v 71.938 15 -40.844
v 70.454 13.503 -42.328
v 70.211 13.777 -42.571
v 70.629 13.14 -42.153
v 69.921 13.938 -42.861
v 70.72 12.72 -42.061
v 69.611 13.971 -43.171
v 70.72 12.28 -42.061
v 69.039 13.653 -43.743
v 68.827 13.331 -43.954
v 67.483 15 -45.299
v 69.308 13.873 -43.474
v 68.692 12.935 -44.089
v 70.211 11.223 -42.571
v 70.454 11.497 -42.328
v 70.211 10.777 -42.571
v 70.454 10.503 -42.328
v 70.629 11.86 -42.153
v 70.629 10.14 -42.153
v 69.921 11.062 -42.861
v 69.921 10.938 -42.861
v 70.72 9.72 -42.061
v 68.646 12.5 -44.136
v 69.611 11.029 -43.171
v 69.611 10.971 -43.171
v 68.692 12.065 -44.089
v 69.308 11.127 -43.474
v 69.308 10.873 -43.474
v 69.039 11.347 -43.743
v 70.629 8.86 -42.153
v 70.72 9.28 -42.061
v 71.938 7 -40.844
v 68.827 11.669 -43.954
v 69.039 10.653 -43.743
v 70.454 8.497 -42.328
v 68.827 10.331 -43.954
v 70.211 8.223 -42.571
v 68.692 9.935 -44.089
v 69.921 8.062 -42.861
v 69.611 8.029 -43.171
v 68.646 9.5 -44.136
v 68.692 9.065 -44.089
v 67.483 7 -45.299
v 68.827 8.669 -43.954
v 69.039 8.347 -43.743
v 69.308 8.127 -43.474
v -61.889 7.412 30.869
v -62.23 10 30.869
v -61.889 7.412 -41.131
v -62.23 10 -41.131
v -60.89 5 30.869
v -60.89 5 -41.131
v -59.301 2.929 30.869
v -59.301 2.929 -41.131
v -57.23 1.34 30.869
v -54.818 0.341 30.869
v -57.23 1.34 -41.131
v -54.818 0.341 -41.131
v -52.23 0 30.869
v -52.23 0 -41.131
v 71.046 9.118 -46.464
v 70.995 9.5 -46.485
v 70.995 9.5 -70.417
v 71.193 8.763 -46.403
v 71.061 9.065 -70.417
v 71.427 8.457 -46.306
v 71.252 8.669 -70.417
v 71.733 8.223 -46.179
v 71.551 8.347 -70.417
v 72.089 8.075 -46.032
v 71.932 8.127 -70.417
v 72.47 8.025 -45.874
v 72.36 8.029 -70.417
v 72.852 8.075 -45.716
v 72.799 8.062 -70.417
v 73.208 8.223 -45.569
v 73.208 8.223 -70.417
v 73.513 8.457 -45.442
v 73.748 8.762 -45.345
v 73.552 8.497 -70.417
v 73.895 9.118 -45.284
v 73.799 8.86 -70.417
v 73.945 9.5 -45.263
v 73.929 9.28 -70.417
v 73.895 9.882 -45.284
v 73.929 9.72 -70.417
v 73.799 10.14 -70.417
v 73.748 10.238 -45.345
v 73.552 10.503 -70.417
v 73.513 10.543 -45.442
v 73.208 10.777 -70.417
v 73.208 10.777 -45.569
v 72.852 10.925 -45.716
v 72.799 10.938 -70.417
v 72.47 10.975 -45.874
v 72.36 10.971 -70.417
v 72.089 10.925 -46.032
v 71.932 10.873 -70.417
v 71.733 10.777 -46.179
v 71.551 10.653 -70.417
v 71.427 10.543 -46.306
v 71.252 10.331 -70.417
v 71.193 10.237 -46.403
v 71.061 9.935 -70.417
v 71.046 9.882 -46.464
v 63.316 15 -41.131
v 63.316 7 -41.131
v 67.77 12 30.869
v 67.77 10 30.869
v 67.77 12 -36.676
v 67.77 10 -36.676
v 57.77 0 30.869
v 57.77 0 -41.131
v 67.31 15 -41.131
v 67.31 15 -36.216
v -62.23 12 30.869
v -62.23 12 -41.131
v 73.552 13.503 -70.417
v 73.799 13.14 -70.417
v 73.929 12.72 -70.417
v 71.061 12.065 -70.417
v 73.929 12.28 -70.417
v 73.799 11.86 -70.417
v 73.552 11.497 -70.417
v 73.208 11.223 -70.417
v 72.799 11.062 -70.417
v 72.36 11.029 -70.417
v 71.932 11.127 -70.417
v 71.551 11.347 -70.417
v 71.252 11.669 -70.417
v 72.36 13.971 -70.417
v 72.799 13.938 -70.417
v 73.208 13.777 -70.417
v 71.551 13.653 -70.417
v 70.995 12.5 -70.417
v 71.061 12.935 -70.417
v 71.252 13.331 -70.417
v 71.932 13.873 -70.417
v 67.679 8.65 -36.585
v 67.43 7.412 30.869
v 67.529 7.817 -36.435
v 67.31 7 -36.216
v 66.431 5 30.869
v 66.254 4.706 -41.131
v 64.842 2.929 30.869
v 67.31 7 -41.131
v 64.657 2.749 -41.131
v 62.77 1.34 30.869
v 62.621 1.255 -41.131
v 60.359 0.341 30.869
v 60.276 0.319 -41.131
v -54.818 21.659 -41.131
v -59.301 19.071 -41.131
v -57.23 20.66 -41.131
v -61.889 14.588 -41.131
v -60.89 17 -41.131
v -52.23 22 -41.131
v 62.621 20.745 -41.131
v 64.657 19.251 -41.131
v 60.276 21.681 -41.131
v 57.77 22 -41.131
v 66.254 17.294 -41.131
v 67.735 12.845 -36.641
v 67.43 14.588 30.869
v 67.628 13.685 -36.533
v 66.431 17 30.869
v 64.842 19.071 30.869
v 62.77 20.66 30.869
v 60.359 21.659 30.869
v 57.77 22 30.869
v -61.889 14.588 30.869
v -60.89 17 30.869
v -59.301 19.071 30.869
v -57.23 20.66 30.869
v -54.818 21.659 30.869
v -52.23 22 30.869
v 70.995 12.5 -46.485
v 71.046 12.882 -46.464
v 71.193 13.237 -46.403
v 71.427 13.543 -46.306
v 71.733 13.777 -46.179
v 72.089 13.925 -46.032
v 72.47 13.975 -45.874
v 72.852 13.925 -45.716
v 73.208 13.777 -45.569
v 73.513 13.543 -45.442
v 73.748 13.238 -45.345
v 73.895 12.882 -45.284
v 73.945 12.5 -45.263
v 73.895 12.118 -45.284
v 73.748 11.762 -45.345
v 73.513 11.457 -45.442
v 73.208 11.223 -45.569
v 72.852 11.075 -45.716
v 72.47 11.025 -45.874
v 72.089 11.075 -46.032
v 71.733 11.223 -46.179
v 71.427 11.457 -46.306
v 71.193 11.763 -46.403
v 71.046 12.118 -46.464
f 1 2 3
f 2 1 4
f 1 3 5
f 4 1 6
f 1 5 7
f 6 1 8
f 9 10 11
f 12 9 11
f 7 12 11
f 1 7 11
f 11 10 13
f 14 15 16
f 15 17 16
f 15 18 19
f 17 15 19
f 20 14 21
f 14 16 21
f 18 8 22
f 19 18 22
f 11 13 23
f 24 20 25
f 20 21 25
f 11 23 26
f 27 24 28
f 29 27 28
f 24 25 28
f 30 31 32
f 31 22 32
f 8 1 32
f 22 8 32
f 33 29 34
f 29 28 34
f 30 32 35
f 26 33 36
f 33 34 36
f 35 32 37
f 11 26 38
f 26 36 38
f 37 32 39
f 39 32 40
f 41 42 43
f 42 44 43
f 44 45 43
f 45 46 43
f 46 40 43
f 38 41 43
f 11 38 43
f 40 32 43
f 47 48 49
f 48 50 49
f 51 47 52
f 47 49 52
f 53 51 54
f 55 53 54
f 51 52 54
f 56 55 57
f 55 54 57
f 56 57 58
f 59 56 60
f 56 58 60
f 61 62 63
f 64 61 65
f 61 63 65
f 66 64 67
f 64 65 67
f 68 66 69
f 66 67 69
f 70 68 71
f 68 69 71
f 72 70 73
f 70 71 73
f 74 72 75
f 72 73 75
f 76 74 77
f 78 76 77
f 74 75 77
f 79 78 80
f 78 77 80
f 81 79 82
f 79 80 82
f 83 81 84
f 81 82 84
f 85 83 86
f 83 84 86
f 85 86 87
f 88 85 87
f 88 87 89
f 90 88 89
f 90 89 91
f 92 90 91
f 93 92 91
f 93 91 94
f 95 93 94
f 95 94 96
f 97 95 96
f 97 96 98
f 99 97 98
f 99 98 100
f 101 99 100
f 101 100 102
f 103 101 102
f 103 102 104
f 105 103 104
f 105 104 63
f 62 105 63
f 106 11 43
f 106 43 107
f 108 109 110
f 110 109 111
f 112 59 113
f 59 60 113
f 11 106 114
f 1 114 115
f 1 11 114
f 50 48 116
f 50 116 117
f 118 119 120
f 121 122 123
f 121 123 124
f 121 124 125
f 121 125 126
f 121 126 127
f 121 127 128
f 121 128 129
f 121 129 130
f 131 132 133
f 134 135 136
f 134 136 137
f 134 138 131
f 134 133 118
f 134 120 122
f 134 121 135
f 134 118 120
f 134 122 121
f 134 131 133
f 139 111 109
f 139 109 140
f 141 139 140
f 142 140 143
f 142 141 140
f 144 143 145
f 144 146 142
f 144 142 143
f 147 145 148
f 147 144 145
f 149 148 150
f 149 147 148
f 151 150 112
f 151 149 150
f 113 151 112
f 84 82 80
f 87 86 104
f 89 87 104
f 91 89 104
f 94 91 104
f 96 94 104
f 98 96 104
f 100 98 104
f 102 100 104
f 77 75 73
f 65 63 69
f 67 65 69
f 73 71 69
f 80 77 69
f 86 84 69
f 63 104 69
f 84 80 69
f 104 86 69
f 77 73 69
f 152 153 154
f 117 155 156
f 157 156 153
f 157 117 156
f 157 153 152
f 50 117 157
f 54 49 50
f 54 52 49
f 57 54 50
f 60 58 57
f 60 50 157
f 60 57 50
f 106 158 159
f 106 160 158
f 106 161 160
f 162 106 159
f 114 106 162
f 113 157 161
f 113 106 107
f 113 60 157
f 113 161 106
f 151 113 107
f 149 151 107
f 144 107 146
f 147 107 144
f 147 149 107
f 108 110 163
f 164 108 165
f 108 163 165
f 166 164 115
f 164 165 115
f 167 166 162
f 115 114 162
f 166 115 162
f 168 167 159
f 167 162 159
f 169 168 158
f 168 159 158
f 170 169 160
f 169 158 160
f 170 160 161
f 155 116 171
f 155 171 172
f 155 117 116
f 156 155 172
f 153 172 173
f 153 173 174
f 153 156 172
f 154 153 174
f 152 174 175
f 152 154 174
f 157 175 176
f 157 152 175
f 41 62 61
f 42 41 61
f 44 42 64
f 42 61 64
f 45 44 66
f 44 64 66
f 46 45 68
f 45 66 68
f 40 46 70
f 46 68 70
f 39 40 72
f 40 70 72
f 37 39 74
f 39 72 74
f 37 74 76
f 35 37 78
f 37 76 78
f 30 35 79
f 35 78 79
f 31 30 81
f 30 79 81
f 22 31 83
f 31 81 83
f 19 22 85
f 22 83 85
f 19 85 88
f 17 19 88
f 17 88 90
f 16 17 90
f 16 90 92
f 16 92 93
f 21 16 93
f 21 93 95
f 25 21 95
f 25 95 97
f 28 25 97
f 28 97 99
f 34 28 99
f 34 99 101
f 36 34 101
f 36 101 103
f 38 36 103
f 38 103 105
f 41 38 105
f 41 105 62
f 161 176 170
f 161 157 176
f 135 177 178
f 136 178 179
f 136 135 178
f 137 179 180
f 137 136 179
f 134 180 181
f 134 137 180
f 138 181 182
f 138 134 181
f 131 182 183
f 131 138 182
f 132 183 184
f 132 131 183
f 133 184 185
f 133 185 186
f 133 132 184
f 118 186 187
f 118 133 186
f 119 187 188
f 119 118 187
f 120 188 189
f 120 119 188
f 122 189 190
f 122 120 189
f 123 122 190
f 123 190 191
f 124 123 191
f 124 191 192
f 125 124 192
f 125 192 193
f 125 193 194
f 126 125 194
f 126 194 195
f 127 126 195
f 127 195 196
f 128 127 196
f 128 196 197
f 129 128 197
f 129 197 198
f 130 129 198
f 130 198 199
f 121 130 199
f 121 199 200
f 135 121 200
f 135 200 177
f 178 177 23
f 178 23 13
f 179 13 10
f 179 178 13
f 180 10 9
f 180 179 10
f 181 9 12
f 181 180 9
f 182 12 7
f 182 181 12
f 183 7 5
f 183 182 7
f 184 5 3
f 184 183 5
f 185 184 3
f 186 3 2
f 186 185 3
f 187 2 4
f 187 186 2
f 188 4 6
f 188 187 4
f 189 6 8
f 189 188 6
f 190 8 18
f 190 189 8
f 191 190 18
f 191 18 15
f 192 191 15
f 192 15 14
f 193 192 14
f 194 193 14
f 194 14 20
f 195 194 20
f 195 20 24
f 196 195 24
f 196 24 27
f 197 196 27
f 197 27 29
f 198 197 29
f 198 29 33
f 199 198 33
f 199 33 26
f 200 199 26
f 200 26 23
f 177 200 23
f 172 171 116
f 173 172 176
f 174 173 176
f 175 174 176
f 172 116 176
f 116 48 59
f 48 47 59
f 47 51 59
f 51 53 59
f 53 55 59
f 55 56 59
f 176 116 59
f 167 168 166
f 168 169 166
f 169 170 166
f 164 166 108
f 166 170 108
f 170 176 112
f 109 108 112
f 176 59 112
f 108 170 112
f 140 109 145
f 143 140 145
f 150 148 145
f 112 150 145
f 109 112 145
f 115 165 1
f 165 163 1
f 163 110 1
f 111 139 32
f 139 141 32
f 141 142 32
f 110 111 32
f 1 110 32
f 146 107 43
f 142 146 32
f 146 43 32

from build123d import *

# Parameters (mm, degrees)
SKETCH_1_W         = 130
SKETCH_1_H         = 72
EXTRUDE_1_DEPTH    = 22
FILLET_2_R         = 10
EXTRUDE_2_DEPTH    = 4
SWEEP_15_PROFILE_R = 1.475


with BuildPart() as part:
    # 草图1 → 凸台-拉伸1 (new body)
    with BuildSketch(Plane(origin=(0, 0, 0), x_dir=(1, 0, 0), z_dir=(0, 1, 0))):
        with Locations((2.770491803, 5.131147541)):
            Rectangle(SKETCH_1_W, SKETCH_1_H)
    extrude(amount=EXTRUDE_1_DEPTH)

    # 圆角2
    fillet_2_edges = [part.edges().sort_by_distance(p)[0] for p in [
        (67.770491803, 22, -5.131147541),
        (-62.229508197, 22, -5.131147541),
        (67.770491803, 0, -5.131147541),
        (-62.229508197, 0, -5.131147541),
    ]]
    fillet(fillet_2_edges, radius=FILLET_2_R)

    # 草图2 → 凸台-拉伸2 (add, symmetric)
    with BuildSketch(Plane(origin=(0, 11, 0), x_dir=(-1, 0, 0), z_dir=(0, -1, 0))):
        Polygon((-62.533388889, 40.348817348), (-66.98816161, 35.894044627), (-71.937909079, 40.843792095), (-67.483136357, 45.298564816), align=None)
    extrude(amount=EXTRUDE_2_DEPTH, both=True)

    # 扫描15: sweep along a path in 草图66
    with BuildLine(Plane(origin=(0, 12.5, 0), x_dir=(1, 0, 0), z_dir=(0, 1, 0))) as sweep_15_path:
        Line((69.689066092, 43.092635082), (72.470448318, 45.874017309))
        Line((72.470448318, 45.874017309), (72.470448318, 70.417467586))
    # 扫描15 profile (on start of the path) → 扫描15 (sweep)
    with BuildSketch(Plane(origin=(69.689066092, 12.5, -43.092635082), x_dir=(-0.7071067811865476, 0, -0.7071067811865476), z_dir=(0.7071067811865476, 0, -0.7071067811865476))):
        Circle(SWEEP_15_PROFILE_R)
    sweep_15 = sweep(path=sweep_15_path.line, transition=Transition.RIGHT)

    # 镜向1: 扫描15 across plane
    add(sweep_15.mirror(Plane(origin=(0, 11, 0), x_dir=(0, 0, 1), z_dir=(0, -1, 0))))


solid = part.part
